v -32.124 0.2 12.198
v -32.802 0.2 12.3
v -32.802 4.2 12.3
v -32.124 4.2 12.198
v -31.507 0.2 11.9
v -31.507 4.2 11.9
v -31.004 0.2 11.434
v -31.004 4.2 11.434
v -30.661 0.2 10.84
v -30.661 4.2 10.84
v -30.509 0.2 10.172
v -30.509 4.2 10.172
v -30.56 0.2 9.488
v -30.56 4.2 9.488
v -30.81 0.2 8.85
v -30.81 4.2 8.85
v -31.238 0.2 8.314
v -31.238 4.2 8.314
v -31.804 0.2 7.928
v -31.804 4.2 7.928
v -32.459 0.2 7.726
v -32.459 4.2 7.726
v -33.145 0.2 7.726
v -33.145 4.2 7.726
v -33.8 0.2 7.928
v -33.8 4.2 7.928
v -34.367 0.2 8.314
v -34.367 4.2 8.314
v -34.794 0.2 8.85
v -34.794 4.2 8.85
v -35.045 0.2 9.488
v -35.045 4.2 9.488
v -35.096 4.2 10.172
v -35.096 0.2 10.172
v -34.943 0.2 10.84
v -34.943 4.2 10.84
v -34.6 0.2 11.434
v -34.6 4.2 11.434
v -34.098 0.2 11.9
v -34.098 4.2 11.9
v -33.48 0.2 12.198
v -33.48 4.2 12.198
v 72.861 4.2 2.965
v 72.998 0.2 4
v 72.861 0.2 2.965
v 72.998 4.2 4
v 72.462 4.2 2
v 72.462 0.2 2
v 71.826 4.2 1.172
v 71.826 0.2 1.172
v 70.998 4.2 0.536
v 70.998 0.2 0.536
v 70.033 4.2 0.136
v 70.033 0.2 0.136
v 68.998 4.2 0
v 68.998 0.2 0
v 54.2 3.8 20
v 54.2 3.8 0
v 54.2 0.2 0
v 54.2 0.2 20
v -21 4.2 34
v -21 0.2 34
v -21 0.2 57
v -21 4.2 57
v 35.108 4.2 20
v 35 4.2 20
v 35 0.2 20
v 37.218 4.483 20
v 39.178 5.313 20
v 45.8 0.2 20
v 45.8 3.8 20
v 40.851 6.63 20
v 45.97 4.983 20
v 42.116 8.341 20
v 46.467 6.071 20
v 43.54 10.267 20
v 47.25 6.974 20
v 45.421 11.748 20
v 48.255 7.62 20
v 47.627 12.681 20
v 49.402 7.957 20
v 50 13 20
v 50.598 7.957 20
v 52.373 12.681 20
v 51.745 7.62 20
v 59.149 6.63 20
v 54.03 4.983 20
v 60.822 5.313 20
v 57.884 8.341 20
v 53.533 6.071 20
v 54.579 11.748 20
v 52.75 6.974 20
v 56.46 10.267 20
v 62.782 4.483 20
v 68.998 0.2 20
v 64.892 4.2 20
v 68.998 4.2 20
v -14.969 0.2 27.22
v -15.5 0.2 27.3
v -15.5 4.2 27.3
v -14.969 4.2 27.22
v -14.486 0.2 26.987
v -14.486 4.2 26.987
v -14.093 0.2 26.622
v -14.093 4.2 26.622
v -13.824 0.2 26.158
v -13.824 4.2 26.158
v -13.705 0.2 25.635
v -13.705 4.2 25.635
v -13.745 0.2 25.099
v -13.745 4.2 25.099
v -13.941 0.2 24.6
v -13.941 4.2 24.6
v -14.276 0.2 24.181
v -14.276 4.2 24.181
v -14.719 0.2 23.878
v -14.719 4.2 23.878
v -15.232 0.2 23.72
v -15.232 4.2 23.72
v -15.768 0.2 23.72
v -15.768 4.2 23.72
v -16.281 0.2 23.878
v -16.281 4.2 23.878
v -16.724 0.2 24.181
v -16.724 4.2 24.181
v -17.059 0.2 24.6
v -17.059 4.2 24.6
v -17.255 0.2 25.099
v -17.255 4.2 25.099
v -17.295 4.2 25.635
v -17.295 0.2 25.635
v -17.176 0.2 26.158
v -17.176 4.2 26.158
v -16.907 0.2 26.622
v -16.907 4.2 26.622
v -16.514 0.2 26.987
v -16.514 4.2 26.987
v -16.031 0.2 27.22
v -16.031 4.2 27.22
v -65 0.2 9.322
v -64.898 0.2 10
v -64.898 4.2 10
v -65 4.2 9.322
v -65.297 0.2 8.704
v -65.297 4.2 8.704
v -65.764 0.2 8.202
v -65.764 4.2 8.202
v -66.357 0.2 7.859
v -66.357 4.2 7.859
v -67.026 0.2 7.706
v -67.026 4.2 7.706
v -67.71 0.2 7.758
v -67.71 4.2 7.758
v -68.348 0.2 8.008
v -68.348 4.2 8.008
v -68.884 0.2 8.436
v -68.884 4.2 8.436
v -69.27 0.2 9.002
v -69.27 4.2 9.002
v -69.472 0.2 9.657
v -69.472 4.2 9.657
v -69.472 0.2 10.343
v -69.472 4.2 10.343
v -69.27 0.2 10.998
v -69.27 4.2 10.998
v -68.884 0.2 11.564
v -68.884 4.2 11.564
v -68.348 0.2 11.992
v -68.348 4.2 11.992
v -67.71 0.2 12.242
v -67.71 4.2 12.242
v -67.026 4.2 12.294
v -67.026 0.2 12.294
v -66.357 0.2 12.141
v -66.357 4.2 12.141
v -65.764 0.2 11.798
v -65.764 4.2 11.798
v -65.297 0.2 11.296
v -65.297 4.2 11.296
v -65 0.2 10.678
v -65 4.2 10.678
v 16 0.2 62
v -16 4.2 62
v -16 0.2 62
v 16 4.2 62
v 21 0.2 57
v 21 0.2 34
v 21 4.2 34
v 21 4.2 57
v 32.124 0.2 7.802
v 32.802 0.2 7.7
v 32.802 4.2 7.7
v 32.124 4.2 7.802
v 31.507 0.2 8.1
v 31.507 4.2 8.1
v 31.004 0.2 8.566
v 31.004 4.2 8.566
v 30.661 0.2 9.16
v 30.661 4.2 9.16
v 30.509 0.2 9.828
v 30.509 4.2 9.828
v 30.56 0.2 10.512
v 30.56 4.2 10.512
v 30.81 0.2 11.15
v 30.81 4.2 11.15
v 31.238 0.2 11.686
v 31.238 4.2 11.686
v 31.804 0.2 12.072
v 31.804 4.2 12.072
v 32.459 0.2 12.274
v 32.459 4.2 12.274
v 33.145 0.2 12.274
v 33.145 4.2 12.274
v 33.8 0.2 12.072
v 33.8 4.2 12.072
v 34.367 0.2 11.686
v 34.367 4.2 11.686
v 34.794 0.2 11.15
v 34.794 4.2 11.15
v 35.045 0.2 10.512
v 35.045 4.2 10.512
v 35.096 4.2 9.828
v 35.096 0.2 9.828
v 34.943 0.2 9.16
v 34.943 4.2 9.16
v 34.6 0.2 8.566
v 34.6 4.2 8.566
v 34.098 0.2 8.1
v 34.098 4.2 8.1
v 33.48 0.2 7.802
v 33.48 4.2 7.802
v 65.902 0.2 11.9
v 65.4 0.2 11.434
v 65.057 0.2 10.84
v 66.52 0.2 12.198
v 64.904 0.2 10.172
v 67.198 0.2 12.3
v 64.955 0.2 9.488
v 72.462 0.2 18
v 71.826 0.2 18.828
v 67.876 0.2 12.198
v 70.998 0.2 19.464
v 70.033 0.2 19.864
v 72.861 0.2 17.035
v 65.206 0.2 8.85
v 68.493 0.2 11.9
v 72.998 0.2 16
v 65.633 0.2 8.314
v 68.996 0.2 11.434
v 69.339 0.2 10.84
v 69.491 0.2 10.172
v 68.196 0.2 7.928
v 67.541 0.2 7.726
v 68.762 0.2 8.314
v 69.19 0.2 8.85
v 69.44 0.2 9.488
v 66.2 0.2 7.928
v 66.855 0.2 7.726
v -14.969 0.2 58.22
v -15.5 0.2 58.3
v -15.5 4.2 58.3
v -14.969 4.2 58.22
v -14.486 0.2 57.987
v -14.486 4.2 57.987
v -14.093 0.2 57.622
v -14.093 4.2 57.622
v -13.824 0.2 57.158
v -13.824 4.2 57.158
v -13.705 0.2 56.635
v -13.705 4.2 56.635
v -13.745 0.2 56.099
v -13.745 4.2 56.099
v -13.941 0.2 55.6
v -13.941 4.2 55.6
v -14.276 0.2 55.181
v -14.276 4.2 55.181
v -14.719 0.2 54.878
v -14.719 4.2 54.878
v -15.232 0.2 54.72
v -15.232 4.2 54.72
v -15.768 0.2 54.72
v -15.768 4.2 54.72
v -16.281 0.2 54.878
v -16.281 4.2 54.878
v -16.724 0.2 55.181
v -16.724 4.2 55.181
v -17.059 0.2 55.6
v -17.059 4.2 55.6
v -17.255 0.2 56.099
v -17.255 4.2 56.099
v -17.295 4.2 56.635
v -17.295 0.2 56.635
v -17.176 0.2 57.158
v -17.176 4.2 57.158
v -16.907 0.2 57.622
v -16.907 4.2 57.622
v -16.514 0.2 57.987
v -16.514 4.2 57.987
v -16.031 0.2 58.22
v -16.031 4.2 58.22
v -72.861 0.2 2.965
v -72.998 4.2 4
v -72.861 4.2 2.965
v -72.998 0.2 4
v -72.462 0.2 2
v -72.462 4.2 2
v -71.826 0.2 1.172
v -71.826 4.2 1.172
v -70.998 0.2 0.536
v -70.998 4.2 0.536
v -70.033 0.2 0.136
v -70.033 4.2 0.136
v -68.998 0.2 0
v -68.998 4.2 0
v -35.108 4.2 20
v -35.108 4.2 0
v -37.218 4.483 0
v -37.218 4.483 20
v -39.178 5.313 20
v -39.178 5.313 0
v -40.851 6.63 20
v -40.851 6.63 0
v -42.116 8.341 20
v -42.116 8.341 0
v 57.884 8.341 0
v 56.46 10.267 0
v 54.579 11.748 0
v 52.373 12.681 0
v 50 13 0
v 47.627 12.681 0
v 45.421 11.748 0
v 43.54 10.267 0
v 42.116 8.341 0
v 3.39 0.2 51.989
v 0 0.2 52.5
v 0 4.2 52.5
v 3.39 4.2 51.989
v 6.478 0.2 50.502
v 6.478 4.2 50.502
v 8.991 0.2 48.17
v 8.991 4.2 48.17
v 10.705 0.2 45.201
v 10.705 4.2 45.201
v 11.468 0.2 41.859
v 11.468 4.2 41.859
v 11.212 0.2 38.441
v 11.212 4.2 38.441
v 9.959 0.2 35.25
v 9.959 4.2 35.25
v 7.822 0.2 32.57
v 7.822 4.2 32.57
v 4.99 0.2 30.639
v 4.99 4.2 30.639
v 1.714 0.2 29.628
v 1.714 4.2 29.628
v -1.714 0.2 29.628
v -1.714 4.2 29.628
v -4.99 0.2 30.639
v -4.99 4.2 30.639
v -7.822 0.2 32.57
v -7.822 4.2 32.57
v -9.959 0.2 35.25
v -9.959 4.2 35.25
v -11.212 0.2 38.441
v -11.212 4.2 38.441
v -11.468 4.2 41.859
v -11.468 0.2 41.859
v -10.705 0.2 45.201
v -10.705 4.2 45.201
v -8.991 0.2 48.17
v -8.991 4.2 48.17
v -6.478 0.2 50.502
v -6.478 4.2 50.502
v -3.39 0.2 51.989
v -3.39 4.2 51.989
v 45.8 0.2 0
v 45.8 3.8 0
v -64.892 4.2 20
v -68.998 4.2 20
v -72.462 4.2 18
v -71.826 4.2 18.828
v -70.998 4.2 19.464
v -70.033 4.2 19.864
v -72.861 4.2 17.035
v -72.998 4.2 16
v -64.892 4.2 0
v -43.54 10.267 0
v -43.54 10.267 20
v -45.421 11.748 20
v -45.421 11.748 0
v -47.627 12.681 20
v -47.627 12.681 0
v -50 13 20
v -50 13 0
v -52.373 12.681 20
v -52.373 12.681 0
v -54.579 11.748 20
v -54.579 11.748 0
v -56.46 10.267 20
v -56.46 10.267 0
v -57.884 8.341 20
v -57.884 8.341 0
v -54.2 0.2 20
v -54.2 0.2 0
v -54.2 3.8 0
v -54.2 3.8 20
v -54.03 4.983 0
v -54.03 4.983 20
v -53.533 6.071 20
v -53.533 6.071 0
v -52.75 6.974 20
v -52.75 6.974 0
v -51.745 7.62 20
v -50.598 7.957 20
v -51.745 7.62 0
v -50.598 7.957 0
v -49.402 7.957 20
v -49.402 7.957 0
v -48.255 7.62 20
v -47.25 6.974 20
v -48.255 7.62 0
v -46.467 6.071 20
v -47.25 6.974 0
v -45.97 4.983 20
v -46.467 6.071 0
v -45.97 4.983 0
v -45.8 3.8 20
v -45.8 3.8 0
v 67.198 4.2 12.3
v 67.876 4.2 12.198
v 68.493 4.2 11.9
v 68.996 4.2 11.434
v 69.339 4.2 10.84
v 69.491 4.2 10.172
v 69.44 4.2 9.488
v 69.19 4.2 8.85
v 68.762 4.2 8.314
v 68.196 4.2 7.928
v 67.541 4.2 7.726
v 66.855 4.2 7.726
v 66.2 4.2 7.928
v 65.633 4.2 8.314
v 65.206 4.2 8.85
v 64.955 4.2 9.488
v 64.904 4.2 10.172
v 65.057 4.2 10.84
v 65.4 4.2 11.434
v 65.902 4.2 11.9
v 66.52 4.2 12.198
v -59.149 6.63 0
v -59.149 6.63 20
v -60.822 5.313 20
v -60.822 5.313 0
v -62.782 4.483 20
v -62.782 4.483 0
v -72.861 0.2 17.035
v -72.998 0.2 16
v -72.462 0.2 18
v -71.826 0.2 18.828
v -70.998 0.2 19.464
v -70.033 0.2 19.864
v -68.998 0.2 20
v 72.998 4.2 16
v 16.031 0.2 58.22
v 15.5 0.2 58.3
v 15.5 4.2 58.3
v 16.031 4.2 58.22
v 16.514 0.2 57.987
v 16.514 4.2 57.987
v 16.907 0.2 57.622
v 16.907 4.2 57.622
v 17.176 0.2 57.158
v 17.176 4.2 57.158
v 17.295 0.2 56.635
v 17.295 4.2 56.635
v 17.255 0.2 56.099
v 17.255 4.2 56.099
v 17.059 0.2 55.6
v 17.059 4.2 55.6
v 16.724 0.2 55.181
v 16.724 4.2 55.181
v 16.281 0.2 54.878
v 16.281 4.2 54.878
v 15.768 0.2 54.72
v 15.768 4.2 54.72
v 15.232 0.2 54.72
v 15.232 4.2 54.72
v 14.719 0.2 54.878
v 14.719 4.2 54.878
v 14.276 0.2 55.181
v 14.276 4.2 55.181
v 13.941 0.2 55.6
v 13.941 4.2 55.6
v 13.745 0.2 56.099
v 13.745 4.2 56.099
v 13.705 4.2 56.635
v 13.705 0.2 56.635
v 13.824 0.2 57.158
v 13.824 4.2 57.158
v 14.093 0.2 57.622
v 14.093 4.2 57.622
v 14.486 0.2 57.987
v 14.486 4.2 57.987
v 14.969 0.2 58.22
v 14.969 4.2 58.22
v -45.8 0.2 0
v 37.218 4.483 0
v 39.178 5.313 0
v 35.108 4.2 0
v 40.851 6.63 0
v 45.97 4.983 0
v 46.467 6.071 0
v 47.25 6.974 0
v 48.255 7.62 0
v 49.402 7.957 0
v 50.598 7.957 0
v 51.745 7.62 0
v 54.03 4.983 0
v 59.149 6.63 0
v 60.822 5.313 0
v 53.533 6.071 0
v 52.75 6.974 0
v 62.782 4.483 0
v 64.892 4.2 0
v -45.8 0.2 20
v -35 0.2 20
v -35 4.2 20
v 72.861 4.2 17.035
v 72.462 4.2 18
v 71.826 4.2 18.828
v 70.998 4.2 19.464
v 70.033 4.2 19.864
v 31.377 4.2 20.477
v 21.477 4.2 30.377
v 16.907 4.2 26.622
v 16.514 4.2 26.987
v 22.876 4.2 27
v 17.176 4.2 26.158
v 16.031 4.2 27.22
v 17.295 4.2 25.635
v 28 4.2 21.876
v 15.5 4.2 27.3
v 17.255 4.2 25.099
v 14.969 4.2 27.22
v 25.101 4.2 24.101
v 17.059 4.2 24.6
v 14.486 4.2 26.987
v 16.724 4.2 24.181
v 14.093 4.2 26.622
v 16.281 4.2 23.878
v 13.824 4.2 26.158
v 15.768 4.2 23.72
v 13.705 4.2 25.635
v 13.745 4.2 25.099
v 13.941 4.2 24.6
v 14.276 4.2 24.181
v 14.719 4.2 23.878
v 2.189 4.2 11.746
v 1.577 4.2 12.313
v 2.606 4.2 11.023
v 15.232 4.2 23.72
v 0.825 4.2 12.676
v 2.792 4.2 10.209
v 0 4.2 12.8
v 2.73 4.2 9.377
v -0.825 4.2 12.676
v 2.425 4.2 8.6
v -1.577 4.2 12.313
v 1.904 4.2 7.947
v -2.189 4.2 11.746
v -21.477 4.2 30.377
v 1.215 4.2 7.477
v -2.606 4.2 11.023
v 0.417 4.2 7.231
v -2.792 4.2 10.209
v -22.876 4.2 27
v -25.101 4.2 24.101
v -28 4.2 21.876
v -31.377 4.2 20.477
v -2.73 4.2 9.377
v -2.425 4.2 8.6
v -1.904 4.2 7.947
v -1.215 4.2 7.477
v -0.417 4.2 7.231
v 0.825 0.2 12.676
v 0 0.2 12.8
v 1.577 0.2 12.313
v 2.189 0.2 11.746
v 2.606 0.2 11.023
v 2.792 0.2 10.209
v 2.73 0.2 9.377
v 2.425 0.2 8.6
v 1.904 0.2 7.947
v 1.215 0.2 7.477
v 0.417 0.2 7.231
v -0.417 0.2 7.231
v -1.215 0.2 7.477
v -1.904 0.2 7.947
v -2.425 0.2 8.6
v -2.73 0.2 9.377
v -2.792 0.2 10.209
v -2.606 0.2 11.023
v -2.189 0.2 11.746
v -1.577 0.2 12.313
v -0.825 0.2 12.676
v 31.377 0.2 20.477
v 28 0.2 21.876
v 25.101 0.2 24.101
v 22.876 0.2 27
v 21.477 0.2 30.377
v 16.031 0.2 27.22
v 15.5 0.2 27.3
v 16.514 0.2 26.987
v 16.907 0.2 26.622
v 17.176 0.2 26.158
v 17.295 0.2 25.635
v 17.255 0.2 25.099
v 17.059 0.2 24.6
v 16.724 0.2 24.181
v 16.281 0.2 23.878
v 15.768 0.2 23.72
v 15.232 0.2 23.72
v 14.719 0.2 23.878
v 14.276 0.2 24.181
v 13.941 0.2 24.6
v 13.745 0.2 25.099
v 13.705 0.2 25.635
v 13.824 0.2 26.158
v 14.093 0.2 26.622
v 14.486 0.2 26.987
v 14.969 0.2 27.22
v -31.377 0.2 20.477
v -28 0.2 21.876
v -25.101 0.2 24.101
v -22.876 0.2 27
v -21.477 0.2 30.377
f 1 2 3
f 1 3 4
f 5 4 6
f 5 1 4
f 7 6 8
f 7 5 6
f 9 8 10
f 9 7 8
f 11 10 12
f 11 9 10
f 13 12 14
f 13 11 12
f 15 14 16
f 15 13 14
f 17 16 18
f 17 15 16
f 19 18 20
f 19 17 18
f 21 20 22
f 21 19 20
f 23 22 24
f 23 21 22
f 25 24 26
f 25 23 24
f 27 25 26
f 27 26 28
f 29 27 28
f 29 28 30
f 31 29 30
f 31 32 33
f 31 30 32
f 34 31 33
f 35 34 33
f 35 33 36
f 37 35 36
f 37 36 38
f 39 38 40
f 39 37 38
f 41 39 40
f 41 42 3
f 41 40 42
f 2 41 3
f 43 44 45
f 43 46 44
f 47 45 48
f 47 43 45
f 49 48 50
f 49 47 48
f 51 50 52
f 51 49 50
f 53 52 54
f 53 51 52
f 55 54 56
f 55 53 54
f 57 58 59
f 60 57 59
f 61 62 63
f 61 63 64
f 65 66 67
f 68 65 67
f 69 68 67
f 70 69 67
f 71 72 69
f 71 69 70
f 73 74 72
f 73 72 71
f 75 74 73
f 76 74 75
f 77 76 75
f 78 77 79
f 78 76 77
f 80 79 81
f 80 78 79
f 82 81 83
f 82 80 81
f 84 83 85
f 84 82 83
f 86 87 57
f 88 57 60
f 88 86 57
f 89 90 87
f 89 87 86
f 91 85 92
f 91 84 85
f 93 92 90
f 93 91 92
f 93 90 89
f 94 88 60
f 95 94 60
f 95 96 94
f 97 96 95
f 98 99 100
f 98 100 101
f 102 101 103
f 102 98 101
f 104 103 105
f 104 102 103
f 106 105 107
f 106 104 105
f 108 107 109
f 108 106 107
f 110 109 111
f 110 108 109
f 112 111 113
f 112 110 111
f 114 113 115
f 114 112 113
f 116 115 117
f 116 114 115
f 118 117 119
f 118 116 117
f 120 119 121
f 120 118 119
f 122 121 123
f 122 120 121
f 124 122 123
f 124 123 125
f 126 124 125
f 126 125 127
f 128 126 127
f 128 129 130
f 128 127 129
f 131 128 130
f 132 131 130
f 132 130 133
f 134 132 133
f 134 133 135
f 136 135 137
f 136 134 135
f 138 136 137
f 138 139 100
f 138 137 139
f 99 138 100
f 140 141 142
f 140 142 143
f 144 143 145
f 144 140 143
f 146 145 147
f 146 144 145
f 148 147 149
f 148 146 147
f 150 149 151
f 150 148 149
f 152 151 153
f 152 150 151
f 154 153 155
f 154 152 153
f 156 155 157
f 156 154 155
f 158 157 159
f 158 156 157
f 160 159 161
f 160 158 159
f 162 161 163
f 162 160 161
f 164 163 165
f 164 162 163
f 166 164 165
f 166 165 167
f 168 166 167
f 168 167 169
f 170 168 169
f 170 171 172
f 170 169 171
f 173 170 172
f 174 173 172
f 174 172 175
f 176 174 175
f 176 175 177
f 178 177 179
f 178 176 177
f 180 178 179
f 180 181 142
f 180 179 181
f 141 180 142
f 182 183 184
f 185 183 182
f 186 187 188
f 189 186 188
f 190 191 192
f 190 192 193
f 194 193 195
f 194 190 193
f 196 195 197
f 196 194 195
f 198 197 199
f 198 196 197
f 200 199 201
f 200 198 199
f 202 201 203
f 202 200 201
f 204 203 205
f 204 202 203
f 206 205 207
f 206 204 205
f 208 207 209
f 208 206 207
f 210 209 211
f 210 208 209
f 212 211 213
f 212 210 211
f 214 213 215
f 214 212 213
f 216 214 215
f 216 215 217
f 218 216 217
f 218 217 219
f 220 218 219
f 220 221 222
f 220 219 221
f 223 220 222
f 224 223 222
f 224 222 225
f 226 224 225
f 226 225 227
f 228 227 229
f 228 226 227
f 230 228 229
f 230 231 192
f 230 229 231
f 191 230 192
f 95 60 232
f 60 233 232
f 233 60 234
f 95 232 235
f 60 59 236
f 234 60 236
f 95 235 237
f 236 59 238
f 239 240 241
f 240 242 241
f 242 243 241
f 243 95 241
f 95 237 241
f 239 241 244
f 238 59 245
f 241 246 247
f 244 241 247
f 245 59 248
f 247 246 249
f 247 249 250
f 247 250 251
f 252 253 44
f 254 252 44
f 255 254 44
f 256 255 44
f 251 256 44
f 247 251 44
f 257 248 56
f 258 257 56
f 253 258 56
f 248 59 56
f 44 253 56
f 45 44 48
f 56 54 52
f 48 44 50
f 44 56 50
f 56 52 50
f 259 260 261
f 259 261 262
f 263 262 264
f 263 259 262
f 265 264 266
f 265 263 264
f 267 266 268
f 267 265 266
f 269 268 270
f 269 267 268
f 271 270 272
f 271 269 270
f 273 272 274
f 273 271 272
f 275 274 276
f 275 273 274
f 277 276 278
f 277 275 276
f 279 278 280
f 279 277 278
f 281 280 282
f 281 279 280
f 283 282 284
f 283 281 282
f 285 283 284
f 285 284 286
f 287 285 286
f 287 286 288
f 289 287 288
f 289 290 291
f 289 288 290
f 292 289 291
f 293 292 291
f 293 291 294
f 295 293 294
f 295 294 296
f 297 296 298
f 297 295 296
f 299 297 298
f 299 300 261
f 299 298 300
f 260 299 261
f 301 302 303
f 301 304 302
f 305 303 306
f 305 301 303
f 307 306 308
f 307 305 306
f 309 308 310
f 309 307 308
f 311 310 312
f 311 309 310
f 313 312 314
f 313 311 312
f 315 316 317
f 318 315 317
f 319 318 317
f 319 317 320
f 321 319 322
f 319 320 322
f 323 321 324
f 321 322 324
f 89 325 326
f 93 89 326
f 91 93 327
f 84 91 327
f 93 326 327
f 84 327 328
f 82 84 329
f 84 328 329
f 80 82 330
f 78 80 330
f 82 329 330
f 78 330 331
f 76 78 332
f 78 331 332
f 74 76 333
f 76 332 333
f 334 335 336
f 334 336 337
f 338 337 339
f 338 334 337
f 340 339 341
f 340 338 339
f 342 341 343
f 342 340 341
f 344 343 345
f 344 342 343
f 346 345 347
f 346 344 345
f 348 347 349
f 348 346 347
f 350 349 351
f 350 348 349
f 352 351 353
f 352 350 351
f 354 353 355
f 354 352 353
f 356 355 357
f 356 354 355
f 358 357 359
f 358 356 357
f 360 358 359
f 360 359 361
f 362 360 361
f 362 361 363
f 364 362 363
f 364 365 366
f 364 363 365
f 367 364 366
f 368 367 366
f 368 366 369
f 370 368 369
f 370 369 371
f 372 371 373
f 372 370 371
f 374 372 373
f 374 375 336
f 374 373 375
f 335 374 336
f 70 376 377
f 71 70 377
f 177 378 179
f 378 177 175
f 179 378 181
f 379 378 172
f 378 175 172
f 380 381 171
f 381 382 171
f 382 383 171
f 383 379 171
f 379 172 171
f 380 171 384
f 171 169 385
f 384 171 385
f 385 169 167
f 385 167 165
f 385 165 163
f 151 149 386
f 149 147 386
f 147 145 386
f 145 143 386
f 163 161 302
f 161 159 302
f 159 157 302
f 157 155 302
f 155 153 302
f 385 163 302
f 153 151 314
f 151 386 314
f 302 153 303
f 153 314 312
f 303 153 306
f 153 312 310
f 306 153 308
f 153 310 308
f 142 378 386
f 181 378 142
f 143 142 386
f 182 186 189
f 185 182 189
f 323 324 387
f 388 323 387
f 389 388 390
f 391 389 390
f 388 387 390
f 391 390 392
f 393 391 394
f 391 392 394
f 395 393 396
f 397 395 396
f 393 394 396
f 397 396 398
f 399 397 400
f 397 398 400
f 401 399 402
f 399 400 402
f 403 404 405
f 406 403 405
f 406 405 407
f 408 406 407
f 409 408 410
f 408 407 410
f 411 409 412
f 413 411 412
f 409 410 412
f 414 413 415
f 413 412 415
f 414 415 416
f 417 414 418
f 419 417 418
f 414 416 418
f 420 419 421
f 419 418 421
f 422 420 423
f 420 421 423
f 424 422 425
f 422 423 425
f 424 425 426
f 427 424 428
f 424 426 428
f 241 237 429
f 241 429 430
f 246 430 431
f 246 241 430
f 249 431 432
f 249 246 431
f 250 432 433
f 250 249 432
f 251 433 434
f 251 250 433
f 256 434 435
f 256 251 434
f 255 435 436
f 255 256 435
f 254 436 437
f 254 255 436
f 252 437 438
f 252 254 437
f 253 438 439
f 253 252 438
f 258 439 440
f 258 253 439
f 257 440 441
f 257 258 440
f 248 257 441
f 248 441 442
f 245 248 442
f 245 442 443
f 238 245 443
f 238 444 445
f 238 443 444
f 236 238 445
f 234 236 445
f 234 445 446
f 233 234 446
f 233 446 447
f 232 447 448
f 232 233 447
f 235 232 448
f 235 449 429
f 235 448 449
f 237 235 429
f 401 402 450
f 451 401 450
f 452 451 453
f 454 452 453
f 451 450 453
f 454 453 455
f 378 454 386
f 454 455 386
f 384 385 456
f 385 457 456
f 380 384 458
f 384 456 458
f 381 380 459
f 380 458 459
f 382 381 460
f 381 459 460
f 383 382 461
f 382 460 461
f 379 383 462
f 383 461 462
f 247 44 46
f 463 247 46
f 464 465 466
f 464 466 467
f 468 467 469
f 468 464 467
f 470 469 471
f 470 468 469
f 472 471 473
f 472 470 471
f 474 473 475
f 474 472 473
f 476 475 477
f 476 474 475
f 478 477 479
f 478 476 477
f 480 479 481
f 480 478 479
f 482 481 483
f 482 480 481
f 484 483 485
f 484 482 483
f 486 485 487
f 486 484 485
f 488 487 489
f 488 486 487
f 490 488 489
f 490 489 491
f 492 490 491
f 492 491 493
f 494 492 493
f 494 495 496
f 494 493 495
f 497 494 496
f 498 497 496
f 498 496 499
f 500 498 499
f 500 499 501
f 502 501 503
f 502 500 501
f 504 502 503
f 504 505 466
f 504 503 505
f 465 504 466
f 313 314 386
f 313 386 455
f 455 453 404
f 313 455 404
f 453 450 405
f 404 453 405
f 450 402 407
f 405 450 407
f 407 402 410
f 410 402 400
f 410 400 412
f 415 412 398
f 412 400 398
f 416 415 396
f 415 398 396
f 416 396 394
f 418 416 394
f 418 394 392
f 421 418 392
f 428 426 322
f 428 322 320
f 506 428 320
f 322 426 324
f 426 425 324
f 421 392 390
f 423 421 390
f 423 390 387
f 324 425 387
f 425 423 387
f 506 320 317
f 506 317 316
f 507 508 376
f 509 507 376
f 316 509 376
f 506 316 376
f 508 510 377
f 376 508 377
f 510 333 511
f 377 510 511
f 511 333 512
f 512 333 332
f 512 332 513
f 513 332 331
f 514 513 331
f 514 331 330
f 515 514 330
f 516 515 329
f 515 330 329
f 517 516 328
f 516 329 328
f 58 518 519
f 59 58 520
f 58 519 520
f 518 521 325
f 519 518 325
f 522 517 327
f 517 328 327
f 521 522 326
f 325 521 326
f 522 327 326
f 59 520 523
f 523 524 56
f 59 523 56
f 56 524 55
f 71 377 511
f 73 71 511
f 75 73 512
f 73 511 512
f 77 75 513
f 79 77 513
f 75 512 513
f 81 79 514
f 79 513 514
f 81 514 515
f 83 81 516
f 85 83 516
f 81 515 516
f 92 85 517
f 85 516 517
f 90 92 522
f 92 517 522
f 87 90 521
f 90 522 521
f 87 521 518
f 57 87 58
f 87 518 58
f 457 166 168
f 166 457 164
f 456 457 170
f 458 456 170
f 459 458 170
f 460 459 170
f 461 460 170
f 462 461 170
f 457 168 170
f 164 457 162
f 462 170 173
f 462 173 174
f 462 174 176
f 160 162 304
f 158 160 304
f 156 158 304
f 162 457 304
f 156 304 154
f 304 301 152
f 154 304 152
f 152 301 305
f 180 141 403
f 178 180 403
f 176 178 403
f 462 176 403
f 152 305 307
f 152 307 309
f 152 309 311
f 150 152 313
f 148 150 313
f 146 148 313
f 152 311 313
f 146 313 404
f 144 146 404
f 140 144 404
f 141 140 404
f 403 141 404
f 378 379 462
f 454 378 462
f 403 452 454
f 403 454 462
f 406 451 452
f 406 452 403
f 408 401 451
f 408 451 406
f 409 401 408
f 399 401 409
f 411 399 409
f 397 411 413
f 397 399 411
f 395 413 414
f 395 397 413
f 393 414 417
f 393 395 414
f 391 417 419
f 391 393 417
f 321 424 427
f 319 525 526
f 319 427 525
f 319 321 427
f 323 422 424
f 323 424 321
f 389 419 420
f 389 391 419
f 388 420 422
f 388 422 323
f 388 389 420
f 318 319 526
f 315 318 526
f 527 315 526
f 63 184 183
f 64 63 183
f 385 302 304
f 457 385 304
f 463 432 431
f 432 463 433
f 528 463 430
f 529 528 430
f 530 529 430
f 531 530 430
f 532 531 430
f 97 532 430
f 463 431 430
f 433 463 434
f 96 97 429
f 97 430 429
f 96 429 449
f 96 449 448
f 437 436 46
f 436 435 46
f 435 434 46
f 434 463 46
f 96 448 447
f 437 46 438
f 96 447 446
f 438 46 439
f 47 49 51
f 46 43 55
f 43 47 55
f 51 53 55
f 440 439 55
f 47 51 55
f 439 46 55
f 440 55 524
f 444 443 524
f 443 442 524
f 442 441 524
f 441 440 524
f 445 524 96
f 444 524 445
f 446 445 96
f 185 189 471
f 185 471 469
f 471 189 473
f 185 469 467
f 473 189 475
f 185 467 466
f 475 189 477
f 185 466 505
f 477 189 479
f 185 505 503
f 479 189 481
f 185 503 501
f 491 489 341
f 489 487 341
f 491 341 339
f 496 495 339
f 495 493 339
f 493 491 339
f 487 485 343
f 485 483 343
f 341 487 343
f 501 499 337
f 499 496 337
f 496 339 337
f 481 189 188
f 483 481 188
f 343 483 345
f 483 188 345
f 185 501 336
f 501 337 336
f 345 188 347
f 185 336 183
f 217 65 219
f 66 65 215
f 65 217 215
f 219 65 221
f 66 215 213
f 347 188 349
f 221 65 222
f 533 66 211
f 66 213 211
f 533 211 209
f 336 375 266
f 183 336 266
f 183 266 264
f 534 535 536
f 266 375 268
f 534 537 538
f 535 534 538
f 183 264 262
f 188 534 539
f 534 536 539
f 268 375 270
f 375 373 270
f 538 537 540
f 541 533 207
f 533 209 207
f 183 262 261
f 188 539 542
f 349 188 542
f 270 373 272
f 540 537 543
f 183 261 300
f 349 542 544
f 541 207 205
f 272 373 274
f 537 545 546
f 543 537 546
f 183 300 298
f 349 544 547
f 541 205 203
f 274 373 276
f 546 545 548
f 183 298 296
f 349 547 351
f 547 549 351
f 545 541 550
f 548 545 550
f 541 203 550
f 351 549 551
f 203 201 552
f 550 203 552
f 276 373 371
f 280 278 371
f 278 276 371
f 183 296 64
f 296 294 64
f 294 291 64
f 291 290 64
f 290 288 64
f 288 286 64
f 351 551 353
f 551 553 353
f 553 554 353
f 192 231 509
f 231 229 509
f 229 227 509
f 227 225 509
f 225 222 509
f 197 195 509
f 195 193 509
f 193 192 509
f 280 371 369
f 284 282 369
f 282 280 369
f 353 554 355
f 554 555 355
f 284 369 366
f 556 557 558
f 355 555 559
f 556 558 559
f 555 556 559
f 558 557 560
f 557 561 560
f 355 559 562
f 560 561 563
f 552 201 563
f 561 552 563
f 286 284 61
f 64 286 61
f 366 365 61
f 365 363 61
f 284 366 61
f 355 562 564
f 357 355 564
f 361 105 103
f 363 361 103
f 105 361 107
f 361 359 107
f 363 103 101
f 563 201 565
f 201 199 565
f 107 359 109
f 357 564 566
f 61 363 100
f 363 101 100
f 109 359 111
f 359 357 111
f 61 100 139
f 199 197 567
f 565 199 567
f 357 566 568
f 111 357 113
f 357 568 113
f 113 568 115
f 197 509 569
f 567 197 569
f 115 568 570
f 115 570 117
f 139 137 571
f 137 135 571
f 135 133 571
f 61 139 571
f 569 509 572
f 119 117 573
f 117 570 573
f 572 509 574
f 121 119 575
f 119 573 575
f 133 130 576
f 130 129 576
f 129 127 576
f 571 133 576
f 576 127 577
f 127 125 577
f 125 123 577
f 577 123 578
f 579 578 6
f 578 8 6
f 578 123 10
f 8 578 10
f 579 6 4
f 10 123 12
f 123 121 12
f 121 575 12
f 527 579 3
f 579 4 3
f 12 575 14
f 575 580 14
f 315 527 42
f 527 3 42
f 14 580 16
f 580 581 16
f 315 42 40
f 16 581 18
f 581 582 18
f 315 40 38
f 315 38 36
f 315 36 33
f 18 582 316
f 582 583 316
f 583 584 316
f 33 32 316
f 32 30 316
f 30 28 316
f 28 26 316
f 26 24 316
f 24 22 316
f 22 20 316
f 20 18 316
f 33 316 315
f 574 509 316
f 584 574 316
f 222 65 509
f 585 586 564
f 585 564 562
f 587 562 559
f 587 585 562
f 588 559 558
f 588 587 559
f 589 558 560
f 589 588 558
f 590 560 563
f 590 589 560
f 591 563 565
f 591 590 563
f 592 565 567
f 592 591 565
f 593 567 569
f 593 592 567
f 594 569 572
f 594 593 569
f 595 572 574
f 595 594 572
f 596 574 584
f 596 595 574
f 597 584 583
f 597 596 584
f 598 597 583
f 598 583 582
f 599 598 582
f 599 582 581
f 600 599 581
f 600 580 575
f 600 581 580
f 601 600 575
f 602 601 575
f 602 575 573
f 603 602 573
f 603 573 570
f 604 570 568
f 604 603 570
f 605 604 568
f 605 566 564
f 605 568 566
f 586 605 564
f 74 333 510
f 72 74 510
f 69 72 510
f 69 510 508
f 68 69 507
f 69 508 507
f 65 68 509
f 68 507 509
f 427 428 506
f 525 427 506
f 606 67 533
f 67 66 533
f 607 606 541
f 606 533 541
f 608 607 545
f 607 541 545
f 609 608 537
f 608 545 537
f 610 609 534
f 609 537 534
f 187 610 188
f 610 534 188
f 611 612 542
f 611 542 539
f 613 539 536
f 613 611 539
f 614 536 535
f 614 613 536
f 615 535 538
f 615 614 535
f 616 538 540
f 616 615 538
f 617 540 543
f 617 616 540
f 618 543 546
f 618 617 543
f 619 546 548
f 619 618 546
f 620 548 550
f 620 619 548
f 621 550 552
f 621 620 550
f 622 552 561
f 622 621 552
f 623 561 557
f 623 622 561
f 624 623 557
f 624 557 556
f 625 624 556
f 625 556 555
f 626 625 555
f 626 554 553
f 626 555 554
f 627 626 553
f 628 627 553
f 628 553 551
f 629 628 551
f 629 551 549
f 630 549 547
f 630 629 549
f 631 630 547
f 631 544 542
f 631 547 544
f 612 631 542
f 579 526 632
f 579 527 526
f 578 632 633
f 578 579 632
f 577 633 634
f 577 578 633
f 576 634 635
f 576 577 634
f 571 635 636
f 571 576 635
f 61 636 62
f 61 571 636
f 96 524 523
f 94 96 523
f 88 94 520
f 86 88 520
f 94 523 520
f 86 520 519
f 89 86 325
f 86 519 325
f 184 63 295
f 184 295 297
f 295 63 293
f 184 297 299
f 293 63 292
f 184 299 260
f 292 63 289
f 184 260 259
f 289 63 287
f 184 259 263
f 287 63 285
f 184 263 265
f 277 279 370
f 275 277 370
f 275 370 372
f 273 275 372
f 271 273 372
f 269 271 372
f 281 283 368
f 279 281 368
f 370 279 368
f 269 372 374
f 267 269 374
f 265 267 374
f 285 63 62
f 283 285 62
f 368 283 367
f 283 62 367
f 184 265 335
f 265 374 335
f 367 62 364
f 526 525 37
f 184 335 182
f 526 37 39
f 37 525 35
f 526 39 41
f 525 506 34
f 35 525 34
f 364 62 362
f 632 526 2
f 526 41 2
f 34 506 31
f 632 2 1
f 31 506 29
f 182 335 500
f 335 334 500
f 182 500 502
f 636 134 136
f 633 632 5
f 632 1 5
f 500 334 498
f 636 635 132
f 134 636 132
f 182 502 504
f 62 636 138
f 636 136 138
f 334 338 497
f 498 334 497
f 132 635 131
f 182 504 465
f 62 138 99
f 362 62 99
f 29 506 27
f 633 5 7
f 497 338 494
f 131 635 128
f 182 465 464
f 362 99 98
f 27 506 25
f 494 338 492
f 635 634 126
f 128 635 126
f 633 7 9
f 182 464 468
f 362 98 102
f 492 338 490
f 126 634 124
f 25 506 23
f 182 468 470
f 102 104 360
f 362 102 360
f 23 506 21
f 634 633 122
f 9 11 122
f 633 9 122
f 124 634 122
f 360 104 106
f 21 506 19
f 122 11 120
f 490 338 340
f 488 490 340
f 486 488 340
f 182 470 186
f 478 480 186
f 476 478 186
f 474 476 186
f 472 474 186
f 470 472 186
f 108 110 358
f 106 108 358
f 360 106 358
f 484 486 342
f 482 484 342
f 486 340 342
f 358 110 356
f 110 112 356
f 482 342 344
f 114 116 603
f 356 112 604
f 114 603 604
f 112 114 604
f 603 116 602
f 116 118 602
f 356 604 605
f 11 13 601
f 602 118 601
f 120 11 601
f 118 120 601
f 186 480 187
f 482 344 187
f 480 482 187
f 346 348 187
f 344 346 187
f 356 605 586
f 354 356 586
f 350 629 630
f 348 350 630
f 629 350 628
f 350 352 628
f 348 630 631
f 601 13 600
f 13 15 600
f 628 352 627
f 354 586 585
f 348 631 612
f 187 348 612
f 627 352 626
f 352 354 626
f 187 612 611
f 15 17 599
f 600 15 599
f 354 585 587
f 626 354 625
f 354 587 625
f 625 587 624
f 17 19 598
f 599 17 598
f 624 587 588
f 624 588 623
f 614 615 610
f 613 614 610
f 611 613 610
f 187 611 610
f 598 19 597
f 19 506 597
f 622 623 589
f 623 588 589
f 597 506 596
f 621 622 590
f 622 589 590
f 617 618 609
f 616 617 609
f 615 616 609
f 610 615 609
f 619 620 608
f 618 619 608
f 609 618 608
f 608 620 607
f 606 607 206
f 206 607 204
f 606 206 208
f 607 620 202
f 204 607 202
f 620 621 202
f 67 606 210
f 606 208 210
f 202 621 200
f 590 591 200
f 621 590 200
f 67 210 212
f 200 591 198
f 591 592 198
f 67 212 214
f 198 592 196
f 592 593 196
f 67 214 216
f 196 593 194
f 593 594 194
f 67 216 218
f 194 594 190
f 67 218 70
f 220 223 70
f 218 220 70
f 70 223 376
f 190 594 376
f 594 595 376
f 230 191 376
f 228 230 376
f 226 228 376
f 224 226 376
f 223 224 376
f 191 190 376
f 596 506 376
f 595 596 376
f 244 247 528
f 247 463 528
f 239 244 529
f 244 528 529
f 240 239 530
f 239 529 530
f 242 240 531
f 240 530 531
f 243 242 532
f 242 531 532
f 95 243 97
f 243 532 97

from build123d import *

# Parameters (mm, degrees)
EXTRUDE_1_DEPTH          = 20
FILLET_1_R               = 4
SKETCH_3_W               = 42
SKETCH_3_H               = 4
EXTRUDE_2_DEPTH          = 42
FILLET_2_R               = 14
CHAMFER_1_SIZE           = 5
CUT_EXTRUDE_1_DEPTH      = 97.177520869
CUT_EXTRUDE_1_DEPTH_BACK = 97.177520869
SKETCH_2_R               = 2.8
SKETCH_2_R_2             = 2.3
SKETCH_2_R_3             = 11.5
SKETCH_2_R_4             = 1.8


with BuildPart() as part:
    # 草图1 → 凸台-拉伸1 (new body)
    with BuildSketch(Plane.XY):
        with BuildLine():
            Line((54.2, 3.8), (54.2, 0.2))
            Line((54.2, 0.2), (72.997777503, 0.2))
            Line((72.997777503, 0.2), (72.997777503, 4.2))
            Line((72.997777503, 4.2), (64.891608375, 4.2))
            ThreePointArc((64.891608375, 4.2), (60.821632223, 5.312671482), (57.883792669, 8.341176471))
            ThreePointArc((57.883792669, 8.341176471), (50, 13), (42.116207331, 8.341176471))
            ThreePointArc((42.116207331, 8.341176471), (39.178367777, 5.312671482), (35.108391625, 4.2))
            Line((35.108391625, 4.2), (-35.108391625, 4.2))
            ThreePointArc((-35.108391625, 4.2), (-39.178367777, 5.312671482), (-42.116207331, 8.341176471))
            ThreePointArc((-42.116207331, 8.341176471), (-50, 13), (-57.883792669, 8.341176471))
            ThreePointArc((-57.883792669, 8.341176471), (-60.821632223, 5.312671482), (-64.891608375, 4.2))
            Line((-64.891608375, 4.2), (-72.997777503, 4.2))
            Line((-72.997777503, 4.2), (-72.997777503, 0.2))
            Line((-72.997777503, 0.2), (-54.2, 0.2))
            Line((-54.2, 0.2), (-54.2, 3.8))
            ThreePointArc((-54.2, 3.8), (-50, 8), (-45.8, 3.8))
            Line((-45.8, 3.8), (-45.8, 0.2))
            Line((-45.8, 0.2), (45.8, 0.2))
            Line((45.8, 0.2), (45.8, 3.8))
            ThreePointArc((45.8, 3.8), (50, 8), (54.2, 3.8))
        make_face()
    extrude(amount=EXTRUDE_1_DEPTH)

    # 圆角1
    fillet_1_edges = [part.edges().sort_by_distance(p)[0] for p in [
        (72.997777503, 2.2, 20),
        (-72.997777503, 2.2, 0),
        (72.997777503, 2.2, 0),
        (-72.997777503, 2.2, 20),
    ]]
    fillet(fillet_1_edges, radius=FILLET_1_R)

    # 草图3 → 凸台-拉伸2 (add)
    with BuildSketch(Plane.XY.offset(20)):
        with Locations((0, 2.2)):
            Rectangle(SKETCH_3_W, SKETCH_3_H)
    extrude(amount=EXTRUDE_2_DEPTH)

    # 圆角2
    fillet_2_edges = [part.edges().sort_by_distance(p)[0] for p in [
        (-21, 2.2, 20),
        (21, 2.2, 20),
    ]]
    fillet(fillet_2_edges, radius=FILLET_2_R)

    # 倒角1
    chamfer_1_edges = [part.edges().sort_by_distance(p)[0] for p in [
        (-21, 2.2, 62),
        (21, 2.2, 62),
    ]]
    chamfer(chamfer_1_edges, length=CHAMFER_1_SIZE)

    # 草图2 → 切除-拉伸1 (cut, two sides: drawn at the far end of the back side and taken through both)
    with BuildSketch(Plane(origin=(0, 4.2, 0), x_dir=(1, 0, 0), z_dir=(0, 1, 0)).offset(-CUT_EXTRUDE_1_DEPTH_BACK)):
        with Locations(Location((0, -10, 0), (0, 0, 270))):
            Circle(SKETCH_2_R)
        with Locations(Location((67.197777503, -10, 0), (0, 0, 270))):
            Circle(SKETCH_2_R_2)
        with Locations(Location((32.802222497, -10, 0), (0, 0, 90))):
            Circle(SKETCH_2_R_2)
        with Locations(Location((-32.802222497, -10, 0), (0, 0, 270))):
            Circle(SKETCH_2_R_2)
        with Locations((-67.197777503, -10)):
            Circle(SKETCH_2_R_2)
        with Locations(Location((0, -41, 0), (0, 0, 270))):
            Circle(SKETCH_2_R_3)
        with Locations(Location((15.5, -25.5, 0), (0, 0, 270))):
            Circle(SKETCH_2_R_4)
        with Locations(Location((15.5, -56.5, 0), (0, 0, 270))):
            Circle(SKETCH_2_R_4)
        with Locations(Location((-15.5, -56.5, 0), (0, 0, 270))):
            Circle(SKETCH_2_R_4)
        with Locations(Location((-15.5, -25.5, 0), (0, 0, 270))):
            Circle(SKETCH_2_R_4)
    extrude(amount=CUT_EXTRUDE_1_DEPTH + CUT_EXTRUDE_1_DEPTH_BACK, mode=Mode.SUBTRACT)


solid = part.part
